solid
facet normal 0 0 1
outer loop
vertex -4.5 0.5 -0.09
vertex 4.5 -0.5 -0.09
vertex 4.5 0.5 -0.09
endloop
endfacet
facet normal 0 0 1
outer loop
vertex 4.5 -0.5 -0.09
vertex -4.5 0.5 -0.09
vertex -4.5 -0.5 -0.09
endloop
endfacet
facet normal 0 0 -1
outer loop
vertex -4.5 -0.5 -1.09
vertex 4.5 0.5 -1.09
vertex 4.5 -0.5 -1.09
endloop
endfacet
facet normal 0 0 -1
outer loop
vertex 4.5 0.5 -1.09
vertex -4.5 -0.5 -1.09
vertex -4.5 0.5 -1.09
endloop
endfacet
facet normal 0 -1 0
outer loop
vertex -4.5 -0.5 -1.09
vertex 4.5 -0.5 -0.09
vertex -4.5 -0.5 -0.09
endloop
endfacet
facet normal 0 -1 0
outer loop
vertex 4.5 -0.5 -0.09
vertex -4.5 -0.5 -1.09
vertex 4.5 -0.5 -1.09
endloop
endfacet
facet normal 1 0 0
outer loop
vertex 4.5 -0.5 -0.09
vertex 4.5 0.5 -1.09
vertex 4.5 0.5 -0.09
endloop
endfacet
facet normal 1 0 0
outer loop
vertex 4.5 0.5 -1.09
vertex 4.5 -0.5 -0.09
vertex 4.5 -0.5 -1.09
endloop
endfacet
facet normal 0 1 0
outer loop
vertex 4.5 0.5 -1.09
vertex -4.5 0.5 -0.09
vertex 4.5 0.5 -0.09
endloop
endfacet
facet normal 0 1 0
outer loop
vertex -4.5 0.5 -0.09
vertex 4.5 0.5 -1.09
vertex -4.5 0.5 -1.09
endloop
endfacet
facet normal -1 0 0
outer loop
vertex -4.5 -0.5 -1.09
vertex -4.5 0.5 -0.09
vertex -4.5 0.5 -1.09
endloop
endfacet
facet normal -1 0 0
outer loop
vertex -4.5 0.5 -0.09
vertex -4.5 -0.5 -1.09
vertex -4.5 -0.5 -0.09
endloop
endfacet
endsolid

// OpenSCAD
union(){translate ([0,0,-0.59])cube([9,1,1],center=true);
resize([8,1,0.1])surface(file = "techtex.png", center = true, convexity = 5,invert=true);}
